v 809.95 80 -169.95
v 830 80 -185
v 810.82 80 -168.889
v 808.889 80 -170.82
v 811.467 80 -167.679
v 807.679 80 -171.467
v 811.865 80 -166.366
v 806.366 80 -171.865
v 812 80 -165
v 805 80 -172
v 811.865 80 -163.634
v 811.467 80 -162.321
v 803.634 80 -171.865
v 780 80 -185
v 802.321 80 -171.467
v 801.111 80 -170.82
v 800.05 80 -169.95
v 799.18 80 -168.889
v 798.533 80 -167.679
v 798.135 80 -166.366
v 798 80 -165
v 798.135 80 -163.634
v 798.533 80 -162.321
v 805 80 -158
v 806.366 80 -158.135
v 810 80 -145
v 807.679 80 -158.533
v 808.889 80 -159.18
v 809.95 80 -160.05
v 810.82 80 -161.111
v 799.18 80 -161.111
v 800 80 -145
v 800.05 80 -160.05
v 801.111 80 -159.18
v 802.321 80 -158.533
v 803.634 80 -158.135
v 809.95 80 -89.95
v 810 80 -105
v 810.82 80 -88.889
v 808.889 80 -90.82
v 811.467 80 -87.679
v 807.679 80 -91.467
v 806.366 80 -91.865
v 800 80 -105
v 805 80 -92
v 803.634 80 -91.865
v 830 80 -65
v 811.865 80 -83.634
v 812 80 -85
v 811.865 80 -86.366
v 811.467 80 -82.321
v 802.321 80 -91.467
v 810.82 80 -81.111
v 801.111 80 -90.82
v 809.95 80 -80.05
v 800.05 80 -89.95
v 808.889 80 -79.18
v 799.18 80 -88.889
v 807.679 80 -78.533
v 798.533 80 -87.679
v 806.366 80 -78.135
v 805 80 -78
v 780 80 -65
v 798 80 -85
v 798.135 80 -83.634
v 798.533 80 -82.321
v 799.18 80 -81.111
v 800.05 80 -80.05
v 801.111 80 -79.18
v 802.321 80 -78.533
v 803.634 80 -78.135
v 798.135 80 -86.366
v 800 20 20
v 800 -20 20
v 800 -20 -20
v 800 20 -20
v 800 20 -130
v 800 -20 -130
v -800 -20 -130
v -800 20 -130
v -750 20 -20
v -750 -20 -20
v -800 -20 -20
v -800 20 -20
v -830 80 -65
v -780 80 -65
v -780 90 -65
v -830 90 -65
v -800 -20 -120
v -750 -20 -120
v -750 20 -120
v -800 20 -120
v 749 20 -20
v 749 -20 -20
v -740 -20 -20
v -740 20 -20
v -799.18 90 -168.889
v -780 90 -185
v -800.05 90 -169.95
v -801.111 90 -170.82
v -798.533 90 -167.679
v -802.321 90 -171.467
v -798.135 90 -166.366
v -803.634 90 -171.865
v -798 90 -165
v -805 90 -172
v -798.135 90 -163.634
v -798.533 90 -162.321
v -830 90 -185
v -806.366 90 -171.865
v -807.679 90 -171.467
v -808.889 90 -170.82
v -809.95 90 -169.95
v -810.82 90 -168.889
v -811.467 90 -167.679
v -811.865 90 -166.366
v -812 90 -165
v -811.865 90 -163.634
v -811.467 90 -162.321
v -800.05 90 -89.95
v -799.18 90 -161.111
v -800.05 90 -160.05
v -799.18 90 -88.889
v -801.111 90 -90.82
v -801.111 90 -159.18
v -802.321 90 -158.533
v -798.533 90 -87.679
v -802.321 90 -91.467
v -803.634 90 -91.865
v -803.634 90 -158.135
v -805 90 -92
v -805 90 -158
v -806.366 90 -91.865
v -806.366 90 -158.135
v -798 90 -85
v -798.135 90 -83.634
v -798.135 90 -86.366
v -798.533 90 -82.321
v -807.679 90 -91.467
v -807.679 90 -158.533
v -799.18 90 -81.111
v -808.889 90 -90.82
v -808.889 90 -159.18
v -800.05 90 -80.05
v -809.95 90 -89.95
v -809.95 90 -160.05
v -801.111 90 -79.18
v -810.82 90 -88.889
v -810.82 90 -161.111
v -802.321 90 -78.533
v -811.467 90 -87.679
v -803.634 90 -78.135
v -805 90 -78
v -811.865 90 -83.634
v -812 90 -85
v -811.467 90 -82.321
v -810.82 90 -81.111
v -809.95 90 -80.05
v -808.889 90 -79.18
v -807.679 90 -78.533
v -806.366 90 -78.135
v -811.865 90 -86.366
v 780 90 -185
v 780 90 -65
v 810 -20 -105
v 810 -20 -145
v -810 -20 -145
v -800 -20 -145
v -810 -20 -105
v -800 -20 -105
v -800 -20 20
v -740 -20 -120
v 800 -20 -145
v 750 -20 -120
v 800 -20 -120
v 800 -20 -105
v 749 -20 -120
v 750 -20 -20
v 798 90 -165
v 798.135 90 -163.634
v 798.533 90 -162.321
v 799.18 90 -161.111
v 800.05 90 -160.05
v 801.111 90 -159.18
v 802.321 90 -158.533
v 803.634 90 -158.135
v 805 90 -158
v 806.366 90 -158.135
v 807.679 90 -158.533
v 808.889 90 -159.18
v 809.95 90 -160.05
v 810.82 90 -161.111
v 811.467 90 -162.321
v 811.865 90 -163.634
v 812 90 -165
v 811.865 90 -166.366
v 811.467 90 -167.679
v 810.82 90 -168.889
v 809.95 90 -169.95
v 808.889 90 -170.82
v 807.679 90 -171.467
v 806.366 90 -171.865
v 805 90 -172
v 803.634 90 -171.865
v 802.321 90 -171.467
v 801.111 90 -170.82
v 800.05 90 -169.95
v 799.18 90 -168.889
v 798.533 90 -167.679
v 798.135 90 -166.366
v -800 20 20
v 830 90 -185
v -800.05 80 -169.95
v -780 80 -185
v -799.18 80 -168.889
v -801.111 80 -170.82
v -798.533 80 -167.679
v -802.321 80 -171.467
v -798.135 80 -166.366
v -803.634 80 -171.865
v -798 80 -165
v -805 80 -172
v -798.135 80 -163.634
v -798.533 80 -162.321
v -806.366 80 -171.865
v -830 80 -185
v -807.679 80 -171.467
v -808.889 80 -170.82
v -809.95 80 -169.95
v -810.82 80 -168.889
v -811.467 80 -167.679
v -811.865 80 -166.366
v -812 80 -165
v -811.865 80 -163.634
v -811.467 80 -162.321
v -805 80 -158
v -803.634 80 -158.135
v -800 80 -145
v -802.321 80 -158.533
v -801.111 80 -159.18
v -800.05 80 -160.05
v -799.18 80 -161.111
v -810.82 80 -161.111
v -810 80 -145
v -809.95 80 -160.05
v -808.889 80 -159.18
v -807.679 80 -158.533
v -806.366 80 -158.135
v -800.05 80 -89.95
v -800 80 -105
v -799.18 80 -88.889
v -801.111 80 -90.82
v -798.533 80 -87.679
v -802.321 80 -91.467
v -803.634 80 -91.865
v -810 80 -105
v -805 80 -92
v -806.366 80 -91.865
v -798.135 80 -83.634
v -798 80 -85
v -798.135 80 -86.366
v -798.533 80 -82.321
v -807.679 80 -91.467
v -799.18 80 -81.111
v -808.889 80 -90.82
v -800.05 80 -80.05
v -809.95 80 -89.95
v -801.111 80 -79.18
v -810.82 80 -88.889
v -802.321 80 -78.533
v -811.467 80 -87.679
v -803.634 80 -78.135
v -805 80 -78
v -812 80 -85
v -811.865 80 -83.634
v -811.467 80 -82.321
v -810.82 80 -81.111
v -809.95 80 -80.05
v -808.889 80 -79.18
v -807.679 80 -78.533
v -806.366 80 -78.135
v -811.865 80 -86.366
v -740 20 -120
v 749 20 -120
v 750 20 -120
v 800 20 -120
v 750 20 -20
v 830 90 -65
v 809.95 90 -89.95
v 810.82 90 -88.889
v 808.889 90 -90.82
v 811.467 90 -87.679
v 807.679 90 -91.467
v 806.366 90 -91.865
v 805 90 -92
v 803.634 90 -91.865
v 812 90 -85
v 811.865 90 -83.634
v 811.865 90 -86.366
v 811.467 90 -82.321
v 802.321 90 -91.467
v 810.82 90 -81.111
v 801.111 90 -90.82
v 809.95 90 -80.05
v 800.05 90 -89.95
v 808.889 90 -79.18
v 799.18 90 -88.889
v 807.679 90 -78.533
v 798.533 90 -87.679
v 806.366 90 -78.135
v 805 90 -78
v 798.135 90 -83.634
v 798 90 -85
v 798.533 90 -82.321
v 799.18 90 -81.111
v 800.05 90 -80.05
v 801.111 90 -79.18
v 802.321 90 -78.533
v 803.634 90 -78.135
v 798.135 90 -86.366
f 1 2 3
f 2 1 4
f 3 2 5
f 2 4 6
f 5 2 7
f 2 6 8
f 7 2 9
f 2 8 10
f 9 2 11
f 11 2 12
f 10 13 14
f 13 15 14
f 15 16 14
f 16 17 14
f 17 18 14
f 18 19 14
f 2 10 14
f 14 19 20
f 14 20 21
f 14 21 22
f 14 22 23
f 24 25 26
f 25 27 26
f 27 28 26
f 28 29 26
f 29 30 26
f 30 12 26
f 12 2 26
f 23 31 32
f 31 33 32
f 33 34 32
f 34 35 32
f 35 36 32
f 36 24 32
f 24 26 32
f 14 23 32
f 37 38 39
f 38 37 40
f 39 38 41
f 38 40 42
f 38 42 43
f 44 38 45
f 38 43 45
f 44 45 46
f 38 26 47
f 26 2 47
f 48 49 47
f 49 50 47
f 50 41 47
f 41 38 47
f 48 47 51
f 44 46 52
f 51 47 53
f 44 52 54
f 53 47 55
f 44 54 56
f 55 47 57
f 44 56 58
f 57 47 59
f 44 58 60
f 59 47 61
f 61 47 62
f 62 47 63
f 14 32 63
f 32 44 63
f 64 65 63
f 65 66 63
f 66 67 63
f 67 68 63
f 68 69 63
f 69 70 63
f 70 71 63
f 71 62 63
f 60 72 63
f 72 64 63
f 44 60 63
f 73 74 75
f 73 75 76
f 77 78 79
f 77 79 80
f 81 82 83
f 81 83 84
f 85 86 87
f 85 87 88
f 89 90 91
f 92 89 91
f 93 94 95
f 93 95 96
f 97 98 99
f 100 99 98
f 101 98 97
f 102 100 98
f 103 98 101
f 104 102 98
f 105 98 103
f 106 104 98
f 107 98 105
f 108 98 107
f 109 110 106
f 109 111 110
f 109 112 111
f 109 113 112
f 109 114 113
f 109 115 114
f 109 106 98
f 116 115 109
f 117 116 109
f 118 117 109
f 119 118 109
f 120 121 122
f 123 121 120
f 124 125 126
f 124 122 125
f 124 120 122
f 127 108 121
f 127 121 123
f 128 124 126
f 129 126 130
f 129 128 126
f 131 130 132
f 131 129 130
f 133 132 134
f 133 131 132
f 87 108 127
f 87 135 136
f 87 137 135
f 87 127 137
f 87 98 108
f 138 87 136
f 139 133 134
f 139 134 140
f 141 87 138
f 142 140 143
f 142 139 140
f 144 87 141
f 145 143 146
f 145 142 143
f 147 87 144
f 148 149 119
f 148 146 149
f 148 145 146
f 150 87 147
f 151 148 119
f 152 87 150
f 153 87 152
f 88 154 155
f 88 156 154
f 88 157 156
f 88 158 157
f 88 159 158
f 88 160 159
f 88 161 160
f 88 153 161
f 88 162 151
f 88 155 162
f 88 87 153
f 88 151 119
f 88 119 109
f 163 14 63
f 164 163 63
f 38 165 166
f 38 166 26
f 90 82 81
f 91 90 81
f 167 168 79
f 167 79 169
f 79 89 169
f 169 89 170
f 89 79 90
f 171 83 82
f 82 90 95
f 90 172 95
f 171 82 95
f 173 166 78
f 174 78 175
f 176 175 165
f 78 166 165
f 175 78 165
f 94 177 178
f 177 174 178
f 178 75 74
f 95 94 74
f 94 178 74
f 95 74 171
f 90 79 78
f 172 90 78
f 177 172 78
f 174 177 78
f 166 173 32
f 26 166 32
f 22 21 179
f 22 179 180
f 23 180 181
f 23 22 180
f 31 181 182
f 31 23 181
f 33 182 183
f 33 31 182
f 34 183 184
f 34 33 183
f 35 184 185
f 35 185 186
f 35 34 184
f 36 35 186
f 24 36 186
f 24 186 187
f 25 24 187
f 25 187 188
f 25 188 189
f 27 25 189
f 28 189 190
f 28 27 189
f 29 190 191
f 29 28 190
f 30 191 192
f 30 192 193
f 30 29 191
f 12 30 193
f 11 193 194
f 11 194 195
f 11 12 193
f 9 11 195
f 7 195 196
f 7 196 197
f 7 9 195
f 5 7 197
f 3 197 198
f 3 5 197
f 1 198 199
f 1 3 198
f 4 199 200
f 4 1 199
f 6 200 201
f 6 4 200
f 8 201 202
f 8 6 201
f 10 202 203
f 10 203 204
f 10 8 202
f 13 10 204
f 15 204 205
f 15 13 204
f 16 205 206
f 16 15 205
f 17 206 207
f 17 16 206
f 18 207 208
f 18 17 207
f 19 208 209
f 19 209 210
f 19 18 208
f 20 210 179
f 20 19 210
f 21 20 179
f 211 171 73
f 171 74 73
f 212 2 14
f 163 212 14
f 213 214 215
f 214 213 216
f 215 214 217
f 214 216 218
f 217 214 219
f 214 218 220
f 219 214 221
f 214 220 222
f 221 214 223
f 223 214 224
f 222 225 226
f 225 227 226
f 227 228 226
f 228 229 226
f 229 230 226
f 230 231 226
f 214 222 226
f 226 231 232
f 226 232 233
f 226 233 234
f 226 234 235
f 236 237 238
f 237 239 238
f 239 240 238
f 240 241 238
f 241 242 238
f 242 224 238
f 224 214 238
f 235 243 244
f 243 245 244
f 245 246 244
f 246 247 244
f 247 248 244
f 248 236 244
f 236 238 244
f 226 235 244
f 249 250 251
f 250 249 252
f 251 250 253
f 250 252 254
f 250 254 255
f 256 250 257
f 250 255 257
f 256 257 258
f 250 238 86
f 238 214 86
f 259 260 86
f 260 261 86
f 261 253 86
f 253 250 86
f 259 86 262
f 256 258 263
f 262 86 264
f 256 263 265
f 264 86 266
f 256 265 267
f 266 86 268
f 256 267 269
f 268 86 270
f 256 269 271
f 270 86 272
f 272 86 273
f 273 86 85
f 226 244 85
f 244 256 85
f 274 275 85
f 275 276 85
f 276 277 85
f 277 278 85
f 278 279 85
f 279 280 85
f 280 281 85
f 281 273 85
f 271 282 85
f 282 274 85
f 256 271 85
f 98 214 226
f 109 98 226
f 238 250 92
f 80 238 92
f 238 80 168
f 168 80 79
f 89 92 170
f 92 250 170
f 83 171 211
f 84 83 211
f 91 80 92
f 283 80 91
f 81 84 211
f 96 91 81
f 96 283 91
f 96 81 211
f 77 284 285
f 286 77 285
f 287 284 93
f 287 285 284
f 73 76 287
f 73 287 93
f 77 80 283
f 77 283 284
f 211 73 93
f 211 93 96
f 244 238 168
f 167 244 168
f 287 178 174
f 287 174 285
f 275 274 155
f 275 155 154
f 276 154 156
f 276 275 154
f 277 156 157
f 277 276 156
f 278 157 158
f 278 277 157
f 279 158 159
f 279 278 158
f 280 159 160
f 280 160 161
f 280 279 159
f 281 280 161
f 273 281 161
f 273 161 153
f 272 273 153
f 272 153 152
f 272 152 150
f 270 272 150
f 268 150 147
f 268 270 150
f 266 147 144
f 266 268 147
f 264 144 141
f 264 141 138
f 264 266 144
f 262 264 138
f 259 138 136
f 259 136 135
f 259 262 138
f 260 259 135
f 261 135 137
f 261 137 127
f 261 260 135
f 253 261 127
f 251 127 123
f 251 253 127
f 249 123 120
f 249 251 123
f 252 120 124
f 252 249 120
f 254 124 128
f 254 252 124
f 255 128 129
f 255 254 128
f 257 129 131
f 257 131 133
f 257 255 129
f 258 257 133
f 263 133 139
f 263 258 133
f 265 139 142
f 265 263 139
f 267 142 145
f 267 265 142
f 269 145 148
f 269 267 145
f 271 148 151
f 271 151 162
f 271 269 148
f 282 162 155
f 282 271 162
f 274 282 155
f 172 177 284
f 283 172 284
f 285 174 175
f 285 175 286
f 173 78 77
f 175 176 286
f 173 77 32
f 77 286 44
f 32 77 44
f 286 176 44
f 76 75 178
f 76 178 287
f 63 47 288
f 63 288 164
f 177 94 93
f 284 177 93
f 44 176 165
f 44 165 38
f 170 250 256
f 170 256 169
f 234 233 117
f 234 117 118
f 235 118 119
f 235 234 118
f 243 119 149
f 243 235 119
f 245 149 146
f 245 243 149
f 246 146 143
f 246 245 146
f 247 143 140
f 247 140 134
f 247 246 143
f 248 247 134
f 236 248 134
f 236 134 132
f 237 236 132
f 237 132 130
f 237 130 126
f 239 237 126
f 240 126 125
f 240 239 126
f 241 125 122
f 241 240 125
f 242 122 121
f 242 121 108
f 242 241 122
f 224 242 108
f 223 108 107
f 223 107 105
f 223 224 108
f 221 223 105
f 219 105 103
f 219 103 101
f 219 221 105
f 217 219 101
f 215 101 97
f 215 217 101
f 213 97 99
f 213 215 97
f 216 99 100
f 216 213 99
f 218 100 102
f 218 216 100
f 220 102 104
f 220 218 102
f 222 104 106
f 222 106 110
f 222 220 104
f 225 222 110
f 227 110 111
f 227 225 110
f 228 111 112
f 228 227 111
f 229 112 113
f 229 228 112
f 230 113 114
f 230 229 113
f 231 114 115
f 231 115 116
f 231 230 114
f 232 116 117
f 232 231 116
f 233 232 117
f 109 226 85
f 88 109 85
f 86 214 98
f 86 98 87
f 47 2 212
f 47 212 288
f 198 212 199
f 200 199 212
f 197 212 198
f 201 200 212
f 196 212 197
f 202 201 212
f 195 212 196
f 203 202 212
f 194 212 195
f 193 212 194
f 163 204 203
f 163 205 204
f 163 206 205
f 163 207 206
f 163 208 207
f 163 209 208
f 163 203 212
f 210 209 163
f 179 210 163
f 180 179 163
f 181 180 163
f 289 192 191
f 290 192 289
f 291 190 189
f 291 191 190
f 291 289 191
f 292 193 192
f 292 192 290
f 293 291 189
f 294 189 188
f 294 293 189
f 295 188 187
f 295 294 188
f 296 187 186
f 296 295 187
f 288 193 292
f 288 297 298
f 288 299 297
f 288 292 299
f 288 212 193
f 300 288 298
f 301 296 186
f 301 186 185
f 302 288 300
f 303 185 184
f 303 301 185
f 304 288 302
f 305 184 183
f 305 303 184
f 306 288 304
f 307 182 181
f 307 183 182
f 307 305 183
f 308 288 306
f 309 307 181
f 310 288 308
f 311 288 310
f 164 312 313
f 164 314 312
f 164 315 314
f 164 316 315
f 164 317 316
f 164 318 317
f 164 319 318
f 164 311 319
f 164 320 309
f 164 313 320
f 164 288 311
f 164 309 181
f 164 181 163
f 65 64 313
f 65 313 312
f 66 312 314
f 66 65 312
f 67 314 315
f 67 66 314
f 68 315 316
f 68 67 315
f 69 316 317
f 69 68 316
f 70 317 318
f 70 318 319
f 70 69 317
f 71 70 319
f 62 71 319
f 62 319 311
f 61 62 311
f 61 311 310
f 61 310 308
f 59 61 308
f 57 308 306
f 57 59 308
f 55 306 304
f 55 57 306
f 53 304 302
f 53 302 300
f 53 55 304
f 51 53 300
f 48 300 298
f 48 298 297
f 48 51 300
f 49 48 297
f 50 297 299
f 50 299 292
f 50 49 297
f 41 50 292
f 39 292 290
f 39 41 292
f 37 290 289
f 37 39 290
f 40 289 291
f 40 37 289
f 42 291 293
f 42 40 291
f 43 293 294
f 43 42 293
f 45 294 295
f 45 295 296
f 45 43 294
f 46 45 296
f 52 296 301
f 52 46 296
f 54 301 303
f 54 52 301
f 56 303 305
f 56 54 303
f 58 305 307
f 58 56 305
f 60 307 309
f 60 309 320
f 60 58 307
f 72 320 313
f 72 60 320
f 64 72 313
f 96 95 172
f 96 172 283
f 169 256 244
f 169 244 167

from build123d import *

# Parameters (mm, degrees)
F0_W          = 40
F0_H          = 40
F1_DEPTH      = 800
F1_DEPTH_BACK = 800
F4_W          = 40
F4_H          = 100
F5_DEPTH      = 10
F6_W          = 40
F6_H          = 100
F7_DEPTH      = 1
F8_W          = 40
F8_H          = 10
F9_DEPTH      = 800
F9_DEPTH_BACK = 800
F10_W         = 100
F10_H         = 40
F11_DEPTH     = 10
F12_W         = 100
F12_H         = 40
F13_DEPTH     = 10
F14_W         = 50
F14_H         = 120
F14_R         = 7
F15_DEPTH     = 10
F16_W         = 50
F16_H         = 120
F16_R         = 7
F17_DEPTH     = 10


with BuildPart() as f1:
    # F0 (on Right) → F1 (new body, two sides)
    with BuildSketch(Plane.YZ) as f1_sk:
        Rectangle(F0_W, F0_H)
    extrude(amount=F1_DEPTH)
    extrude(f1_sk.sketch, amount=-F1_DEPTH_BACK)

    # F4 (on offset) → F5 (join)
    with BuildSketch(Plane.YZ.offset(-750)):
        with Locations((0, -70)):
            Rectangle(F4_W, F4_H)
    extrude(amount=F5_DEPTH)

    # F6 (on offset) → F7 (join)
    with BuildSketch(Plane.YZ.offset(750)):
        with Locations((0, -70)):
            Rectangle(F6_W, F6_H)
    extrude(amount=-F7_DEPTH)

    # F8 (on Right) → F9 (join, two sides)
    with BuildSketch(Plane.YZ) as f9_sk:
        with Locations((0, -125)):
            Rectangle(F8_W, F8_H)
    extrude(amount=F9_DEPTH)
    extrude(f9_sk.sketch, amount=-F9_DEPTH_BACK)

    # F10 (on face) → F11 (join)
    with BuildSketch(Plane.YZ.offset(800)):
        with Locations((30, -125)):
            Rectangle(F10_W, F10_H)
    extrude(amount=F11_DEPTH)

    # F12 (on face) → F13 (join)
    with BuildSketch(Plane(origin=(-800, 0, 0), x_dir=(0, -1, 0), z_dir=(-1, 0, 0))):
        with Locations((-30, -125)):
            Rectangle(F12_W, F12_H)
    extrude(amount=F13_DEPTH)

    # F14 (on face) → F15 (join)
    with BuildSketch(Plane(origin=(0, 80, 0), x_dir=(-1, 0, 0), z_dir=(0, 1, 0))):
        with Locations((-805, -125)):
            Rectangle(F14_W, F14_H)
        with Locations((-805, -165)):
            Circle(F14_R, mode=Mode.SUBTRACT)
        with Locations((-805, -85)):
            Circle(F14_R, mode=Mode.SUBTRACT)
    extrude(amount=F15_DEPTH)

    # F16 (on face) → F17 (join)
    with BuildSketch(Plane(origin=(0, 80, 0), x_dir=(-1, 0, 0), z_dir=(0, 1, 0))):
        with Locations((805, -125)):
            Rectangle(F16_W, F16_H)
        with Locations((805, -165)):
            Circle(F16_R, mode=Mode.SUBTRACT)
        with Locations((805, -85)):
            Circle(F16_R, mode=Mode.SUBTRACT)
    extrude(amount=F17_DEPTH)


solid = f1.part
